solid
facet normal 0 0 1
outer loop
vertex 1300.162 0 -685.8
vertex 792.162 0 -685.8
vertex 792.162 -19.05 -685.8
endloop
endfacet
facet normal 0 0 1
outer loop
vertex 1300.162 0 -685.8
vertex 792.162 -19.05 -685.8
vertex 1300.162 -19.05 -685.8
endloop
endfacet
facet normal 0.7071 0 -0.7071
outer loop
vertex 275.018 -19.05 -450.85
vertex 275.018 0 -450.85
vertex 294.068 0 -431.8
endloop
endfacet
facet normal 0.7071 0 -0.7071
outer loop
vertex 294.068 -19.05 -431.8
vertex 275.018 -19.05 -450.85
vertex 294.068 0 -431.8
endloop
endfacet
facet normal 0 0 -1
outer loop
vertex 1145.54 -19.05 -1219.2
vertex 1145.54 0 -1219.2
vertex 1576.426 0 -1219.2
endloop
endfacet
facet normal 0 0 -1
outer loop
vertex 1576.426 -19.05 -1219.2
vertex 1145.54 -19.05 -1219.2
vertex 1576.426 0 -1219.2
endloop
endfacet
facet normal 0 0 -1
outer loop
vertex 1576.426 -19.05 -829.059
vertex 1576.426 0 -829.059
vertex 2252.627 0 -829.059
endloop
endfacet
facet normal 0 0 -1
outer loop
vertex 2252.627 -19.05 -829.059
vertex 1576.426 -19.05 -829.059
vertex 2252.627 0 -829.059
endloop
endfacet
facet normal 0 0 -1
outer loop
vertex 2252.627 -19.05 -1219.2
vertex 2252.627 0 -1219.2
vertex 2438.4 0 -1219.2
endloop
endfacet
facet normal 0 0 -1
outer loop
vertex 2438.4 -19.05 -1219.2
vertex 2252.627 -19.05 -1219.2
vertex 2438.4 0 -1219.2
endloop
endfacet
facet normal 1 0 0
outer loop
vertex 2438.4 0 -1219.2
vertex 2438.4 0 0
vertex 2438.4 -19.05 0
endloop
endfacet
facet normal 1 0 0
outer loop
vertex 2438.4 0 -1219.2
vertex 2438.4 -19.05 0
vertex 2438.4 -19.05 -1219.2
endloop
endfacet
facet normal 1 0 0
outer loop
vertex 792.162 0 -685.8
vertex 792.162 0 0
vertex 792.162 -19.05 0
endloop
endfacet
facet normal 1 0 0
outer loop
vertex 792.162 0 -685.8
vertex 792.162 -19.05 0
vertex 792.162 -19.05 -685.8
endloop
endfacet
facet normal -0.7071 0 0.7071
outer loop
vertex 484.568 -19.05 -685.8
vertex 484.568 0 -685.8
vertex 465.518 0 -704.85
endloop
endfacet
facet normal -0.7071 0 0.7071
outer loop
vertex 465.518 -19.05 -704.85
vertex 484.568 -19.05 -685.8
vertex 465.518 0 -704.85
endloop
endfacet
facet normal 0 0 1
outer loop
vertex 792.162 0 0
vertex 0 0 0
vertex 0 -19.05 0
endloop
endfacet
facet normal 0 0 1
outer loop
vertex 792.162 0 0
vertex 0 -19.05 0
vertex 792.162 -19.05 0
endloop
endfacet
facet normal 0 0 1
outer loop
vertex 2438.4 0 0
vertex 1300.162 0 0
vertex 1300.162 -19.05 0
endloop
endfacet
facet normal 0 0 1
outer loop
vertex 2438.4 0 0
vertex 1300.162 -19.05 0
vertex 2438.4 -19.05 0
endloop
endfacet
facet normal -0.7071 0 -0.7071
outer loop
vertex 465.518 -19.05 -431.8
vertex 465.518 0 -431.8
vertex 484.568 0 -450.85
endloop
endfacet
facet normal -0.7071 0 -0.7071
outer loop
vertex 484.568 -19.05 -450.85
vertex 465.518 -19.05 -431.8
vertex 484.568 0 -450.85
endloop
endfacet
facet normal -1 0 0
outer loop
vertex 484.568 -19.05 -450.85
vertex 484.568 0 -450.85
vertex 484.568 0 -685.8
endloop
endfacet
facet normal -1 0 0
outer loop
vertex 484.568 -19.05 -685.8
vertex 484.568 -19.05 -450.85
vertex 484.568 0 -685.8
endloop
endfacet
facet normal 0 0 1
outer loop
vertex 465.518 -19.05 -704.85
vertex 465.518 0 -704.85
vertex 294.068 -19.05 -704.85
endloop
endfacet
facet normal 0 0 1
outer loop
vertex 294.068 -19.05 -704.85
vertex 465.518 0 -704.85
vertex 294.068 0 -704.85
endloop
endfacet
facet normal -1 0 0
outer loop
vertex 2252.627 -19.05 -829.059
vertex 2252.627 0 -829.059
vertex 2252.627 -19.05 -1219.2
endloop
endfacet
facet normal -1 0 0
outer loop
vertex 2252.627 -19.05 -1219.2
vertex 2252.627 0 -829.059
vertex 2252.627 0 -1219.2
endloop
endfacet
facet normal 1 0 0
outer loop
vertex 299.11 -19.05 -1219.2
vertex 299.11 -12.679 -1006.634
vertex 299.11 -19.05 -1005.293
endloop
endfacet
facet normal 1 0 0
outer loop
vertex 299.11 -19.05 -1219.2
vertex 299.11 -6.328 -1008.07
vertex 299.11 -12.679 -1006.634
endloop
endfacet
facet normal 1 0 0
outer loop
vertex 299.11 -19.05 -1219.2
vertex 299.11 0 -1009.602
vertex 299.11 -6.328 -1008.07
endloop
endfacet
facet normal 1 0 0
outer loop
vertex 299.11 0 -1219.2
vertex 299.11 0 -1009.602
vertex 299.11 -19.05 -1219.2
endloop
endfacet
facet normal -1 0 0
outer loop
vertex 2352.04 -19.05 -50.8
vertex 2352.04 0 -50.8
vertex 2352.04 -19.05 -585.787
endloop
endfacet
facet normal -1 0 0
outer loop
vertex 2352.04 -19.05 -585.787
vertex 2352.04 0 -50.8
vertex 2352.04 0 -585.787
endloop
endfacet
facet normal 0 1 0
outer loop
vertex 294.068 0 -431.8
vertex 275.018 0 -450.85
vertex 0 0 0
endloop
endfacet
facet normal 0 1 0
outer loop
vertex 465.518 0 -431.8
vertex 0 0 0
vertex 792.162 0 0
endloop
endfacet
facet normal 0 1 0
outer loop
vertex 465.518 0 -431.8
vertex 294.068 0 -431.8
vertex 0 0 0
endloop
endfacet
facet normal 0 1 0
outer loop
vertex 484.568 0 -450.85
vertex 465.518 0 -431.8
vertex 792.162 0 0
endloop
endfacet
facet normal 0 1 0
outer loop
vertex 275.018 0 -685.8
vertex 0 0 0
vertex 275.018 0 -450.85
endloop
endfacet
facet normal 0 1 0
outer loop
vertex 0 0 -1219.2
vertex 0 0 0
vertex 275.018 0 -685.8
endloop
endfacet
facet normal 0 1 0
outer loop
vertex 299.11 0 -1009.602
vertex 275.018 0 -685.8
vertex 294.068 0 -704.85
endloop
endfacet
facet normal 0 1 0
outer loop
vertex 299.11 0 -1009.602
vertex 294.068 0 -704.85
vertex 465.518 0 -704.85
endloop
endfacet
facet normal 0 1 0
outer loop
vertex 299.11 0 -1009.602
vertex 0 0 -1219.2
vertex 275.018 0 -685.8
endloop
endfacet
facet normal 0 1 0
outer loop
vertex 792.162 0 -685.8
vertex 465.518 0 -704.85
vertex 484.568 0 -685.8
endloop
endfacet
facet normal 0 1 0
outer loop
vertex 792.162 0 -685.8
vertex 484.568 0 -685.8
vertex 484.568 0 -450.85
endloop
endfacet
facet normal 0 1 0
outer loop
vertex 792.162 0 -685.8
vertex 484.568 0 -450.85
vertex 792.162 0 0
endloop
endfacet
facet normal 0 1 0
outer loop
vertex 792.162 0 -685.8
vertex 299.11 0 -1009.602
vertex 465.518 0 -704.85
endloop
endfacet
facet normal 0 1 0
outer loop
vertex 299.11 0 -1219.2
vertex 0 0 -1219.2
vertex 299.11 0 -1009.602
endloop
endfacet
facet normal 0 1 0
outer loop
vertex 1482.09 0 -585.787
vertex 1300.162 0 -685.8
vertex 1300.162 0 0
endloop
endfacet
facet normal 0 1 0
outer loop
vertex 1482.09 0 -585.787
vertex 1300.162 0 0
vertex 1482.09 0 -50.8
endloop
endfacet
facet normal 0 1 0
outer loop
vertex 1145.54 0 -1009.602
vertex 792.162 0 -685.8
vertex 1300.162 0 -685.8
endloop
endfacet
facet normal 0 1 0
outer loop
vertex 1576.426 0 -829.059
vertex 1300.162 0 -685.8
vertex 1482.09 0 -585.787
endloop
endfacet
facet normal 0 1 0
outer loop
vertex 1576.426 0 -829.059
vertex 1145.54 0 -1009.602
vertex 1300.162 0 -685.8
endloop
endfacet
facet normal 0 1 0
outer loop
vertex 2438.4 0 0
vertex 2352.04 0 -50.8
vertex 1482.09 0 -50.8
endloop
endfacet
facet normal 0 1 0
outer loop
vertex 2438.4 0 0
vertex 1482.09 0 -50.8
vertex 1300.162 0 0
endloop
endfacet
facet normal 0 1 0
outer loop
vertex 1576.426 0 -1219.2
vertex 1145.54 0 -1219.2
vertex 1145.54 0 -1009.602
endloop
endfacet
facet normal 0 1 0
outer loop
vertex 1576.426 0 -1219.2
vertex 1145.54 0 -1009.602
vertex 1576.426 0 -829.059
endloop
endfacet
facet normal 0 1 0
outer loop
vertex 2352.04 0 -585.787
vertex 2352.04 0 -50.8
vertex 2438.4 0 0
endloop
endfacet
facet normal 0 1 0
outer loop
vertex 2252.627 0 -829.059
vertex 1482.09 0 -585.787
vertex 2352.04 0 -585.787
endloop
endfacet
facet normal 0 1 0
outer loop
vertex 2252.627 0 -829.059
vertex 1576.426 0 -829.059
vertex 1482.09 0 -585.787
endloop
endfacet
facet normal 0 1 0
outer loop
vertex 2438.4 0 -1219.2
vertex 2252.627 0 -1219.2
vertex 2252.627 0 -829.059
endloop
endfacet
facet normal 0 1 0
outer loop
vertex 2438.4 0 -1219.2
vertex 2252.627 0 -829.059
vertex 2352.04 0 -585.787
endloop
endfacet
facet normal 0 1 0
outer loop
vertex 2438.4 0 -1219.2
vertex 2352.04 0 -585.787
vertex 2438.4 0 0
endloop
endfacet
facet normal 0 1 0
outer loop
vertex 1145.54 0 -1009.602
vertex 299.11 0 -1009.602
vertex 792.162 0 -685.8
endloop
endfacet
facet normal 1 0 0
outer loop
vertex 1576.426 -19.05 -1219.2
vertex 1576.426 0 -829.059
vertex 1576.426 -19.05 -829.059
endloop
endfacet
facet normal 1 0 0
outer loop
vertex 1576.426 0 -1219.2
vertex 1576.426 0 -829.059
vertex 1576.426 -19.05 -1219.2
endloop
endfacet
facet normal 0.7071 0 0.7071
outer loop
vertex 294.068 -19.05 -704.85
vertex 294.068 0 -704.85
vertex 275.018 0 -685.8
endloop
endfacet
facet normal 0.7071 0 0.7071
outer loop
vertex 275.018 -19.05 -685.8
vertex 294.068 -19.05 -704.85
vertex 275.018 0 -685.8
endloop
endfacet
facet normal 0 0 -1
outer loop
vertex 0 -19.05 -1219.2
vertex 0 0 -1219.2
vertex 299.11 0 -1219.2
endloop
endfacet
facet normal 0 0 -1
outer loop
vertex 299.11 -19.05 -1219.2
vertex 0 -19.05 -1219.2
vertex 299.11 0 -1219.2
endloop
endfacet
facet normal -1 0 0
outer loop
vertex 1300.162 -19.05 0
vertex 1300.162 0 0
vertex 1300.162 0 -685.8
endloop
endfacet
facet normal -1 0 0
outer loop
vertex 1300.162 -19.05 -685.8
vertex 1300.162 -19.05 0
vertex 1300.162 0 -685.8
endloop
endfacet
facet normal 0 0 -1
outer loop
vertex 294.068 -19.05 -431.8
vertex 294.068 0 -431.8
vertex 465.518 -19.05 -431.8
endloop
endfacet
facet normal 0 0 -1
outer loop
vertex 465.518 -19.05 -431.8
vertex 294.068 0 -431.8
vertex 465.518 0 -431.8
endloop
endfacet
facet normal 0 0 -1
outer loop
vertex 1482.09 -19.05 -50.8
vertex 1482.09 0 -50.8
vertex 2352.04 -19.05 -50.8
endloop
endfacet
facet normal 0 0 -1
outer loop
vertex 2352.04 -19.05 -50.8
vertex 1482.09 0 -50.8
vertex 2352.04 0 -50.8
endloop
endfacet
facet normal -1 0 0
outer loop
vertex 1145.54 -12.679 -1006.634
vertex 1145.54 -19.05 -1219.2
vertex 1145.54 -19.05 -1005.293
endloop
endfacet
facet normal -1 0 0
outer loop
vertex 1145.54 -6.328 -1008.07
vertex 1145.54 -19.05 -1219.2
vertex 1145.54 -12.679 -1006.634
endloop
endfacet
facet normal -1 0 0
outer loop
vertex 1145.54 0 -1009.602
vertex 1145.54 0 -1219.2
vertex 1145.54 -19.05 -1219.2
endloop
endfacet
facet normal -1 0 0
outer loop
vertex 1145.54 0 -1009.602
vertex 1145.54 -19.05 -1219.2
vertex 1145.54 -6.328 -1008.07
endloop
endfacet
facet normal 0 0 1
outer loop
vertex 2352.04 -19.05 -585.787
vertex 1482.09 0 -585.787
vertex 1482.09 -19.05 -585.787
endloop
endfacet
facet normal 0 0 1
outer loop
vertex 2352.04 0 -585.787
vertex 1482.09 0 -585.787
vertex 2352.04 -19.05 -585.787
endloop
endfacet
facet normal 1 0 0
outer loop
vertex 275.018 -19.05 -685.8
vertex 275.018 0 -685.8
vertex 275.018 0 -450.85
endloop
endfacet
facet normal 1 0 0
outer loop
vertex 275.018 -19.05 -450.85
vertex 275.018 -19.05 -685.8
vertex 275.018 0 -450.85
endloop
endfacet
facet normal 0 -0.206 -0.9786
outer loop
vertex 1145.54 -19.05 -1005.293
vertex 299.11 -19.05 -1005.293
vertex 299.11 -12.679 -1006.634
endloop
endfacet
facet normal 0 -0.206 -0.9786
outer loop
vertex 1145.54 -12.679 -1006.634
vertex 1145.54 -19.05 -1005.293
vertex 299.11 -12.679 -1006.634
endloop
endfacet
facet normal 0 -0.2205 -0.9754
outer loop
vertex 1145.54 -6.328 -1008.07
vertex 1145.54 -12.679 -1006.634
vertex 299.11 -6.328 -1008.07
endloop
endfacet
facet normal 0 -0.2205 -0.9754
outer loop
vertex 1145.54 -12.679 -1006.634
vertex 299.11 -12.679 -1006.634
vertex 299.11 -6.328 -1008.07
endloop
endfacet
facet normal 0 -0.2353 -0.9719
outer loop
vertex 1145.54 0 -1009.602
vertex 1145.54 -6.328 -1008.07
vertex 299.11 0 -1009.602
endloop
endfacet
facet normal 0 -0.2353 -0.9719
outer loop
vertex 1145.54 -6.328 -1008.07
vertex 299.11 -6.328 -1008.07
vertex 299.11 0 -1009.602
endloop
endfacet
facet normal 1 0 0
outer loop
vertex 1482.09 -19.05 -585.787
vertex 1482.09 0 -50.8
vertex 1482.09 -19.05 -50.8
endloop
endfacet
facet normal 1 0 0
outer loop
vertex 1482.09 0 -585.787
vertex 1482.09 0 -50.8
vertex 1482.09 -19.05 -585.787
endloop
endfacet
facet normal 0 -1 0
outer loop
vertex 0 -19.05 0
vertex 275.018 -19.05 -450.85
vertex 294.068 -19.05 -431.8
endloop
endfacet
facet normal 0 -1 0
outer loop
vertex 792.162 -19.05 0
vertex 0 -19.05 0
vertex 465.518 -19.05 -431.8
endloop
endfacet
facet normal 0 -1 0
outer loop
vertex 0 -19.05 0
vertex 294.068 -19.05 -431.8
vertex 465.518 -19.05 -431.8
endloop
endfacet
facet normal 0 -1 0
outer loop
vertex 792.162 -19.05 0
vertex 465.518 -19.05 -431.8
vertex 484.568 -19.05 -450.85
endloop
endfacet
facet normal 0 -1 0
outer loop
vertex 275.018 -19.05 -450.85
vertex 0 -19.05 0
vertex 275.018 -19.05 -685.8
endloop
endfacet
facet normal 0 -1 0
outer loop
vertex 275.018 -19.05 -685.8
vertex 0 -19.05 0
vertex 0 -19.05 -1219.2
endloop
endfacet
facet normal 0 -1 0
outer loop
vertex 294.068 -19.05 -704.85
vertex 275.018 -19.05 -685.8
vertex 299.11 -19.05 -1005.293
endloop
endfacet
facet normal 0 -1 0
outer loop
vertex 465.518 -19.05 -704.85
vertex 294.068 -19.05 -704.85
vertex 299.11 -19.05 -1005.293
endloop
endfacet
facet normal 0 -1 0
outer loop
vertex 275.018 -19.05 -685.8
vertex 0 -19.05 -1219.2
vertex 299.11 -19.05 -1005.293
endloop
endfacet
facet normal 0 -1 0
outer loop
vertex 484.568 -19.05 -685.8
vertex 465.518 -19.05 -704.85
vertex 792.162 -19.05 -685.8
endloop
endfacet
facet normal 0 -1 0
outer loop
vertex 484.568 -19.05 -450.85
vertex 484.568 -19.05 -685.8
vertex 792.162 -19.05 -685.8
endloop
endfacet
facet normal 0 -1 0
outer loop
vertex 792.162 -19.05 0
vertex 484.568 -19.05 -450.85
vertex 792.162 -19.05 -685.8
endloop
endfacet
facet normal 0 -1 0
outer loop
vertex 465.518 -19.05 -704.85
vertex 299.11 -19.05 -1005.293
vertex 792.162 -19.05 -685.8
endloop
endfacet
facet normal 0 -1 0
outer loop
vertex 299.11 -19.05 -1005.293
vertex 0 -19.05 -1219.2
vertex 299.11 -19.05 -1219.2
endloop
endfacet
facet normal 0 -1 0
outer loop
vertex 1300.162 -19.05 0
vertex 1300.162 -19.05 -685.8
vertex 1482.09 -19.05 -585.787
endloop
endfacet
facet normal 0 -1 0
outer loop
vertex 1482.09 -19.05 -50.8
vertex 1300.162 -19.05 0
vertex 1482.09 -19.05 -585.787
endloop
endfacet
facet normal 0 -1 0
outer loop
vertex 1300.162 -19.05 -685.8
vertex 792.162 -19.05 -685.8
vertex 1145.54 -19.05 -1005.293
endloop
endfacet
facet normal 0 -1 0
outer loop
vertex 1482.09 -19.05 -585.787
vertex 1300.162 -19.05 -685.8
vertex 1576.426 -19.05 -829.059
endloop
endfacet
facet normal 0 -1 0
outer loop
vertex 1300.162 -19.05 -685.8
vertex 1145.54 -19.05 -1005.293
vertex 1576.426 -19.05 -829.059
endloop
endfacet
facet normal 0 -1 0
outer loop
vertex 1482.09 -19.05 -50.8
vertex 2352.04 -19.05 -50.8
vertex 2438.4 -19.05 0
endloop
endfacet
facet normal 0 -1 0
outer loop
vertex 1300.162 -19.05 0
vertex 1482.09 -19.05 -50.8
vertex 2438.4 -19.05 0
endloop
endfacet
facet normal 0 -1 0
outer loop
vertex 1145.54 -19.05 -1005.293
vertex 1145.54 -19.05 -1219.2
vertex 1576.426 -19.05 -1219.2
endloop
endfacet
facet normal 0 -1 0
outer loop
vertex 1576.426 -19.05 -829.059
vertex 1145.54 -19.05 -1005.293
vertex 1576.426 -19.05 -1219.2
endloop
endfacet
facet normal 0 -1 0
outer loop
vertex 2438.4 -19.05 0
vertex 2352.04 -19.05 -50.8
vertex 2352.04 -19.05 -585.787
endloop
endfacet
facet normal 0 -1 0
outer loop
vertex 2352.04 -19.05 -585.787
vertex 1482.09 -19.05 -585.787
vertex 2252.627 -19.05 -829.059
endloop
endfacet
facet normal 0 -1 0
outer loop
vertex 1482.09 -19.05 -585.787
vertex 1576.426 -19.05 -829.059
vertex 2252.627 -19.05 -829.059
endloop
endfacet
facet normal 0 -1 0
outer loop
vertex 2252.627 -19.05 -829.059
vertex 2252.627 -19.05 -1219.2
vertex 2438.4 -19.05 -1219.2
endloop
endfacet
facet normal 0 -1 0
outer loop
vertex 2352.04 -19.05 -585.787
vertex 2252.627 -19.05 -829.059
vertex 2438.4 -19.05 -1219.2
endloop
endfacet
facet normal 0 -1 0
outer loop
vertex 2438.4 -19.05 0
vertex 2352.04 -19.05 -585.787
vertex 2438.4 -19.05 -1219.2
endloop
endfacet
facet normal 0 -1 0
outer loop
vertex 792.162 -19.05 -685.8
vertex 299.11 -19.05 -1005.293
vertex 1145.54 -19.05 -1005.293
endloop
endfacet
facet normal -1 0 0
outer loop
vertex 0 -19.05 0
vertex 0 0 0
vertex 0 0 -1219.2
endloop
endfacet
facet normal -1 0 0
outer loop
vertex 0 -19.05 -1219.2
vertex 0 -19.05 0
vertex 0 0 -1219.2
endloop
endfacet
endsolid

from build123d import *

# Parameters (mm, degrees)
SKETCH1_W           = 2438.4
SKETCH1_H           = 1219.2
BOSS_EXTRUDE1_DEPTH = 19.05
SKETCH2_W           = 869.95
SKETCH2_H           = 534.9875
CUT_EXTRUDE1_DEPTH  = 20.05
SKETCH3_W           = 508
SKETCH3_H           = 685.8
CUT_EXTRUDE2_DEPTH  = 20.05
SKETCH4_W           = 676.20134
SKETCH4_H           = 863.85146
CUT_EXTRUDE3_DEPTH  = 20.05
SKETCH5_W           = 846.4296
SKETCH5_H           = 206.375
CUT_EXTRUDE4_DEPTH  = 20.05
CUT_EXTRUDE6_DEPTH  = 20.05
CUT_EXTRUDE7_DEPTH  = 846.4296


with BuildPart() as part:
    # Sketch1 → Boss-Extrude1 (new body)
    with BuildSketch(Plane(origin=(0, 0, 0), x_dir=(1, 0, 0), z_dir=(0, 1, 0))):
        with Locations((1219.2, 609.6)):
            Rectangle(SKETCH1_W, SKETCH1_H)
    extrude(amount=-BOSS_EXTRUDE1_DEPTH)

    # Sketch2 → Cut-Extrude1 (cut, through all)
    with BuildSketch(Plane(origin=(0, 0, 0), x_dir=(1, 0, 0), z_dir=(0, 1, 0))):
        with Locations((1917.065, 318.29375)):
            Rectangle(SKETCH2_W, SKETCH2_H)
    extrude(amount=-CUT_EXTRUDE1_DEPTH, mode=Mode.SUBTRACT)

    # Sketch3 → Cut-Extrude2 (cut, through all)
    with BuildSketch(Plane(origin=(0, 0, 0), x_dir=(1, 0, 0), z_dir=(0, 1, 0))):
        with Locations((1046.1625, 342.9)):
            Rectangle(SKETCH3_W, SKETCH3_H)
    extrude(amount=-CUT_EXTRUDE2_DEPTH, mode=Mode.SUBTRACT)

    # Sketch4 → Cut-Extrude3 (cut, through all)
    with BuildSketch(Plane(origin=(0, 0, 0), x_dir=(1, 0, 0), z_dir=(0, 1, 0))):
        with Locations((1914.52627, 1260.98427)):
            Rectangle(SKETCH4_W, SKETCH4_H)
    extrude(amount=-CUT_EXTRUDE3_DEPTH, mode=Mode.SUBTRACT)

    # Sketch5 → Cut-Extrude4 (cut, through all)
    with BuildSketch(Plane(origin=(0, 0, 0), x_dir=(1, 0, 0), z_dir=(0, 1, 0))):
        with Locations((722.3252, 1116.0125)):
            Rectangle(SKETCH5_W, SKETCH5_H)
    extrude(amount=-CUT_EXTRUDE4_DEPTH, mode=Mode.SUBTRACT)

    # Sketch8 → Cut-Extrude6 (cut, through all)
    with BuildSketch(Plane(origin=(0, 0, 0), x_dir=(1, 0, 0), z_dir=(0, 1, 0))):
        Polygon((294.0685, 704.85), (275.0185, 685.8), (275.0185, 450.85), (294.0685, 431.8), (465.5185, 431.8), (484.5685, 450.85), (484.5685, 685.8), (465.5185, 704.85), align=None)
    extrude(amount=-CUT_EXTRUDE6_DEPTH, mode=Mode.SUBTRACT)

    # Sketch9 → Cut-Extrude7 (cut)
    with BuildSketch(Plane.ZY.offset(-299.1104)):
        with BuildLine():
            Line((-1009.601754844, 0), (-1219.2, 0))
            Line((-1219.2, 0), (-1219.2, -19.05))
            Line((-1219.2, -19.05), (-1005.293201675, -19.05))
            ThreePointArc((-1005.293201675, -19.05), (-1007.340207177, -9.500738417), (-1009.601754844, 0))
        make_face()
    extrude(amount=-CUT_EXTRUDE7_DEPTH, mode=Mode.SUBTRACT)


solid = part.part
